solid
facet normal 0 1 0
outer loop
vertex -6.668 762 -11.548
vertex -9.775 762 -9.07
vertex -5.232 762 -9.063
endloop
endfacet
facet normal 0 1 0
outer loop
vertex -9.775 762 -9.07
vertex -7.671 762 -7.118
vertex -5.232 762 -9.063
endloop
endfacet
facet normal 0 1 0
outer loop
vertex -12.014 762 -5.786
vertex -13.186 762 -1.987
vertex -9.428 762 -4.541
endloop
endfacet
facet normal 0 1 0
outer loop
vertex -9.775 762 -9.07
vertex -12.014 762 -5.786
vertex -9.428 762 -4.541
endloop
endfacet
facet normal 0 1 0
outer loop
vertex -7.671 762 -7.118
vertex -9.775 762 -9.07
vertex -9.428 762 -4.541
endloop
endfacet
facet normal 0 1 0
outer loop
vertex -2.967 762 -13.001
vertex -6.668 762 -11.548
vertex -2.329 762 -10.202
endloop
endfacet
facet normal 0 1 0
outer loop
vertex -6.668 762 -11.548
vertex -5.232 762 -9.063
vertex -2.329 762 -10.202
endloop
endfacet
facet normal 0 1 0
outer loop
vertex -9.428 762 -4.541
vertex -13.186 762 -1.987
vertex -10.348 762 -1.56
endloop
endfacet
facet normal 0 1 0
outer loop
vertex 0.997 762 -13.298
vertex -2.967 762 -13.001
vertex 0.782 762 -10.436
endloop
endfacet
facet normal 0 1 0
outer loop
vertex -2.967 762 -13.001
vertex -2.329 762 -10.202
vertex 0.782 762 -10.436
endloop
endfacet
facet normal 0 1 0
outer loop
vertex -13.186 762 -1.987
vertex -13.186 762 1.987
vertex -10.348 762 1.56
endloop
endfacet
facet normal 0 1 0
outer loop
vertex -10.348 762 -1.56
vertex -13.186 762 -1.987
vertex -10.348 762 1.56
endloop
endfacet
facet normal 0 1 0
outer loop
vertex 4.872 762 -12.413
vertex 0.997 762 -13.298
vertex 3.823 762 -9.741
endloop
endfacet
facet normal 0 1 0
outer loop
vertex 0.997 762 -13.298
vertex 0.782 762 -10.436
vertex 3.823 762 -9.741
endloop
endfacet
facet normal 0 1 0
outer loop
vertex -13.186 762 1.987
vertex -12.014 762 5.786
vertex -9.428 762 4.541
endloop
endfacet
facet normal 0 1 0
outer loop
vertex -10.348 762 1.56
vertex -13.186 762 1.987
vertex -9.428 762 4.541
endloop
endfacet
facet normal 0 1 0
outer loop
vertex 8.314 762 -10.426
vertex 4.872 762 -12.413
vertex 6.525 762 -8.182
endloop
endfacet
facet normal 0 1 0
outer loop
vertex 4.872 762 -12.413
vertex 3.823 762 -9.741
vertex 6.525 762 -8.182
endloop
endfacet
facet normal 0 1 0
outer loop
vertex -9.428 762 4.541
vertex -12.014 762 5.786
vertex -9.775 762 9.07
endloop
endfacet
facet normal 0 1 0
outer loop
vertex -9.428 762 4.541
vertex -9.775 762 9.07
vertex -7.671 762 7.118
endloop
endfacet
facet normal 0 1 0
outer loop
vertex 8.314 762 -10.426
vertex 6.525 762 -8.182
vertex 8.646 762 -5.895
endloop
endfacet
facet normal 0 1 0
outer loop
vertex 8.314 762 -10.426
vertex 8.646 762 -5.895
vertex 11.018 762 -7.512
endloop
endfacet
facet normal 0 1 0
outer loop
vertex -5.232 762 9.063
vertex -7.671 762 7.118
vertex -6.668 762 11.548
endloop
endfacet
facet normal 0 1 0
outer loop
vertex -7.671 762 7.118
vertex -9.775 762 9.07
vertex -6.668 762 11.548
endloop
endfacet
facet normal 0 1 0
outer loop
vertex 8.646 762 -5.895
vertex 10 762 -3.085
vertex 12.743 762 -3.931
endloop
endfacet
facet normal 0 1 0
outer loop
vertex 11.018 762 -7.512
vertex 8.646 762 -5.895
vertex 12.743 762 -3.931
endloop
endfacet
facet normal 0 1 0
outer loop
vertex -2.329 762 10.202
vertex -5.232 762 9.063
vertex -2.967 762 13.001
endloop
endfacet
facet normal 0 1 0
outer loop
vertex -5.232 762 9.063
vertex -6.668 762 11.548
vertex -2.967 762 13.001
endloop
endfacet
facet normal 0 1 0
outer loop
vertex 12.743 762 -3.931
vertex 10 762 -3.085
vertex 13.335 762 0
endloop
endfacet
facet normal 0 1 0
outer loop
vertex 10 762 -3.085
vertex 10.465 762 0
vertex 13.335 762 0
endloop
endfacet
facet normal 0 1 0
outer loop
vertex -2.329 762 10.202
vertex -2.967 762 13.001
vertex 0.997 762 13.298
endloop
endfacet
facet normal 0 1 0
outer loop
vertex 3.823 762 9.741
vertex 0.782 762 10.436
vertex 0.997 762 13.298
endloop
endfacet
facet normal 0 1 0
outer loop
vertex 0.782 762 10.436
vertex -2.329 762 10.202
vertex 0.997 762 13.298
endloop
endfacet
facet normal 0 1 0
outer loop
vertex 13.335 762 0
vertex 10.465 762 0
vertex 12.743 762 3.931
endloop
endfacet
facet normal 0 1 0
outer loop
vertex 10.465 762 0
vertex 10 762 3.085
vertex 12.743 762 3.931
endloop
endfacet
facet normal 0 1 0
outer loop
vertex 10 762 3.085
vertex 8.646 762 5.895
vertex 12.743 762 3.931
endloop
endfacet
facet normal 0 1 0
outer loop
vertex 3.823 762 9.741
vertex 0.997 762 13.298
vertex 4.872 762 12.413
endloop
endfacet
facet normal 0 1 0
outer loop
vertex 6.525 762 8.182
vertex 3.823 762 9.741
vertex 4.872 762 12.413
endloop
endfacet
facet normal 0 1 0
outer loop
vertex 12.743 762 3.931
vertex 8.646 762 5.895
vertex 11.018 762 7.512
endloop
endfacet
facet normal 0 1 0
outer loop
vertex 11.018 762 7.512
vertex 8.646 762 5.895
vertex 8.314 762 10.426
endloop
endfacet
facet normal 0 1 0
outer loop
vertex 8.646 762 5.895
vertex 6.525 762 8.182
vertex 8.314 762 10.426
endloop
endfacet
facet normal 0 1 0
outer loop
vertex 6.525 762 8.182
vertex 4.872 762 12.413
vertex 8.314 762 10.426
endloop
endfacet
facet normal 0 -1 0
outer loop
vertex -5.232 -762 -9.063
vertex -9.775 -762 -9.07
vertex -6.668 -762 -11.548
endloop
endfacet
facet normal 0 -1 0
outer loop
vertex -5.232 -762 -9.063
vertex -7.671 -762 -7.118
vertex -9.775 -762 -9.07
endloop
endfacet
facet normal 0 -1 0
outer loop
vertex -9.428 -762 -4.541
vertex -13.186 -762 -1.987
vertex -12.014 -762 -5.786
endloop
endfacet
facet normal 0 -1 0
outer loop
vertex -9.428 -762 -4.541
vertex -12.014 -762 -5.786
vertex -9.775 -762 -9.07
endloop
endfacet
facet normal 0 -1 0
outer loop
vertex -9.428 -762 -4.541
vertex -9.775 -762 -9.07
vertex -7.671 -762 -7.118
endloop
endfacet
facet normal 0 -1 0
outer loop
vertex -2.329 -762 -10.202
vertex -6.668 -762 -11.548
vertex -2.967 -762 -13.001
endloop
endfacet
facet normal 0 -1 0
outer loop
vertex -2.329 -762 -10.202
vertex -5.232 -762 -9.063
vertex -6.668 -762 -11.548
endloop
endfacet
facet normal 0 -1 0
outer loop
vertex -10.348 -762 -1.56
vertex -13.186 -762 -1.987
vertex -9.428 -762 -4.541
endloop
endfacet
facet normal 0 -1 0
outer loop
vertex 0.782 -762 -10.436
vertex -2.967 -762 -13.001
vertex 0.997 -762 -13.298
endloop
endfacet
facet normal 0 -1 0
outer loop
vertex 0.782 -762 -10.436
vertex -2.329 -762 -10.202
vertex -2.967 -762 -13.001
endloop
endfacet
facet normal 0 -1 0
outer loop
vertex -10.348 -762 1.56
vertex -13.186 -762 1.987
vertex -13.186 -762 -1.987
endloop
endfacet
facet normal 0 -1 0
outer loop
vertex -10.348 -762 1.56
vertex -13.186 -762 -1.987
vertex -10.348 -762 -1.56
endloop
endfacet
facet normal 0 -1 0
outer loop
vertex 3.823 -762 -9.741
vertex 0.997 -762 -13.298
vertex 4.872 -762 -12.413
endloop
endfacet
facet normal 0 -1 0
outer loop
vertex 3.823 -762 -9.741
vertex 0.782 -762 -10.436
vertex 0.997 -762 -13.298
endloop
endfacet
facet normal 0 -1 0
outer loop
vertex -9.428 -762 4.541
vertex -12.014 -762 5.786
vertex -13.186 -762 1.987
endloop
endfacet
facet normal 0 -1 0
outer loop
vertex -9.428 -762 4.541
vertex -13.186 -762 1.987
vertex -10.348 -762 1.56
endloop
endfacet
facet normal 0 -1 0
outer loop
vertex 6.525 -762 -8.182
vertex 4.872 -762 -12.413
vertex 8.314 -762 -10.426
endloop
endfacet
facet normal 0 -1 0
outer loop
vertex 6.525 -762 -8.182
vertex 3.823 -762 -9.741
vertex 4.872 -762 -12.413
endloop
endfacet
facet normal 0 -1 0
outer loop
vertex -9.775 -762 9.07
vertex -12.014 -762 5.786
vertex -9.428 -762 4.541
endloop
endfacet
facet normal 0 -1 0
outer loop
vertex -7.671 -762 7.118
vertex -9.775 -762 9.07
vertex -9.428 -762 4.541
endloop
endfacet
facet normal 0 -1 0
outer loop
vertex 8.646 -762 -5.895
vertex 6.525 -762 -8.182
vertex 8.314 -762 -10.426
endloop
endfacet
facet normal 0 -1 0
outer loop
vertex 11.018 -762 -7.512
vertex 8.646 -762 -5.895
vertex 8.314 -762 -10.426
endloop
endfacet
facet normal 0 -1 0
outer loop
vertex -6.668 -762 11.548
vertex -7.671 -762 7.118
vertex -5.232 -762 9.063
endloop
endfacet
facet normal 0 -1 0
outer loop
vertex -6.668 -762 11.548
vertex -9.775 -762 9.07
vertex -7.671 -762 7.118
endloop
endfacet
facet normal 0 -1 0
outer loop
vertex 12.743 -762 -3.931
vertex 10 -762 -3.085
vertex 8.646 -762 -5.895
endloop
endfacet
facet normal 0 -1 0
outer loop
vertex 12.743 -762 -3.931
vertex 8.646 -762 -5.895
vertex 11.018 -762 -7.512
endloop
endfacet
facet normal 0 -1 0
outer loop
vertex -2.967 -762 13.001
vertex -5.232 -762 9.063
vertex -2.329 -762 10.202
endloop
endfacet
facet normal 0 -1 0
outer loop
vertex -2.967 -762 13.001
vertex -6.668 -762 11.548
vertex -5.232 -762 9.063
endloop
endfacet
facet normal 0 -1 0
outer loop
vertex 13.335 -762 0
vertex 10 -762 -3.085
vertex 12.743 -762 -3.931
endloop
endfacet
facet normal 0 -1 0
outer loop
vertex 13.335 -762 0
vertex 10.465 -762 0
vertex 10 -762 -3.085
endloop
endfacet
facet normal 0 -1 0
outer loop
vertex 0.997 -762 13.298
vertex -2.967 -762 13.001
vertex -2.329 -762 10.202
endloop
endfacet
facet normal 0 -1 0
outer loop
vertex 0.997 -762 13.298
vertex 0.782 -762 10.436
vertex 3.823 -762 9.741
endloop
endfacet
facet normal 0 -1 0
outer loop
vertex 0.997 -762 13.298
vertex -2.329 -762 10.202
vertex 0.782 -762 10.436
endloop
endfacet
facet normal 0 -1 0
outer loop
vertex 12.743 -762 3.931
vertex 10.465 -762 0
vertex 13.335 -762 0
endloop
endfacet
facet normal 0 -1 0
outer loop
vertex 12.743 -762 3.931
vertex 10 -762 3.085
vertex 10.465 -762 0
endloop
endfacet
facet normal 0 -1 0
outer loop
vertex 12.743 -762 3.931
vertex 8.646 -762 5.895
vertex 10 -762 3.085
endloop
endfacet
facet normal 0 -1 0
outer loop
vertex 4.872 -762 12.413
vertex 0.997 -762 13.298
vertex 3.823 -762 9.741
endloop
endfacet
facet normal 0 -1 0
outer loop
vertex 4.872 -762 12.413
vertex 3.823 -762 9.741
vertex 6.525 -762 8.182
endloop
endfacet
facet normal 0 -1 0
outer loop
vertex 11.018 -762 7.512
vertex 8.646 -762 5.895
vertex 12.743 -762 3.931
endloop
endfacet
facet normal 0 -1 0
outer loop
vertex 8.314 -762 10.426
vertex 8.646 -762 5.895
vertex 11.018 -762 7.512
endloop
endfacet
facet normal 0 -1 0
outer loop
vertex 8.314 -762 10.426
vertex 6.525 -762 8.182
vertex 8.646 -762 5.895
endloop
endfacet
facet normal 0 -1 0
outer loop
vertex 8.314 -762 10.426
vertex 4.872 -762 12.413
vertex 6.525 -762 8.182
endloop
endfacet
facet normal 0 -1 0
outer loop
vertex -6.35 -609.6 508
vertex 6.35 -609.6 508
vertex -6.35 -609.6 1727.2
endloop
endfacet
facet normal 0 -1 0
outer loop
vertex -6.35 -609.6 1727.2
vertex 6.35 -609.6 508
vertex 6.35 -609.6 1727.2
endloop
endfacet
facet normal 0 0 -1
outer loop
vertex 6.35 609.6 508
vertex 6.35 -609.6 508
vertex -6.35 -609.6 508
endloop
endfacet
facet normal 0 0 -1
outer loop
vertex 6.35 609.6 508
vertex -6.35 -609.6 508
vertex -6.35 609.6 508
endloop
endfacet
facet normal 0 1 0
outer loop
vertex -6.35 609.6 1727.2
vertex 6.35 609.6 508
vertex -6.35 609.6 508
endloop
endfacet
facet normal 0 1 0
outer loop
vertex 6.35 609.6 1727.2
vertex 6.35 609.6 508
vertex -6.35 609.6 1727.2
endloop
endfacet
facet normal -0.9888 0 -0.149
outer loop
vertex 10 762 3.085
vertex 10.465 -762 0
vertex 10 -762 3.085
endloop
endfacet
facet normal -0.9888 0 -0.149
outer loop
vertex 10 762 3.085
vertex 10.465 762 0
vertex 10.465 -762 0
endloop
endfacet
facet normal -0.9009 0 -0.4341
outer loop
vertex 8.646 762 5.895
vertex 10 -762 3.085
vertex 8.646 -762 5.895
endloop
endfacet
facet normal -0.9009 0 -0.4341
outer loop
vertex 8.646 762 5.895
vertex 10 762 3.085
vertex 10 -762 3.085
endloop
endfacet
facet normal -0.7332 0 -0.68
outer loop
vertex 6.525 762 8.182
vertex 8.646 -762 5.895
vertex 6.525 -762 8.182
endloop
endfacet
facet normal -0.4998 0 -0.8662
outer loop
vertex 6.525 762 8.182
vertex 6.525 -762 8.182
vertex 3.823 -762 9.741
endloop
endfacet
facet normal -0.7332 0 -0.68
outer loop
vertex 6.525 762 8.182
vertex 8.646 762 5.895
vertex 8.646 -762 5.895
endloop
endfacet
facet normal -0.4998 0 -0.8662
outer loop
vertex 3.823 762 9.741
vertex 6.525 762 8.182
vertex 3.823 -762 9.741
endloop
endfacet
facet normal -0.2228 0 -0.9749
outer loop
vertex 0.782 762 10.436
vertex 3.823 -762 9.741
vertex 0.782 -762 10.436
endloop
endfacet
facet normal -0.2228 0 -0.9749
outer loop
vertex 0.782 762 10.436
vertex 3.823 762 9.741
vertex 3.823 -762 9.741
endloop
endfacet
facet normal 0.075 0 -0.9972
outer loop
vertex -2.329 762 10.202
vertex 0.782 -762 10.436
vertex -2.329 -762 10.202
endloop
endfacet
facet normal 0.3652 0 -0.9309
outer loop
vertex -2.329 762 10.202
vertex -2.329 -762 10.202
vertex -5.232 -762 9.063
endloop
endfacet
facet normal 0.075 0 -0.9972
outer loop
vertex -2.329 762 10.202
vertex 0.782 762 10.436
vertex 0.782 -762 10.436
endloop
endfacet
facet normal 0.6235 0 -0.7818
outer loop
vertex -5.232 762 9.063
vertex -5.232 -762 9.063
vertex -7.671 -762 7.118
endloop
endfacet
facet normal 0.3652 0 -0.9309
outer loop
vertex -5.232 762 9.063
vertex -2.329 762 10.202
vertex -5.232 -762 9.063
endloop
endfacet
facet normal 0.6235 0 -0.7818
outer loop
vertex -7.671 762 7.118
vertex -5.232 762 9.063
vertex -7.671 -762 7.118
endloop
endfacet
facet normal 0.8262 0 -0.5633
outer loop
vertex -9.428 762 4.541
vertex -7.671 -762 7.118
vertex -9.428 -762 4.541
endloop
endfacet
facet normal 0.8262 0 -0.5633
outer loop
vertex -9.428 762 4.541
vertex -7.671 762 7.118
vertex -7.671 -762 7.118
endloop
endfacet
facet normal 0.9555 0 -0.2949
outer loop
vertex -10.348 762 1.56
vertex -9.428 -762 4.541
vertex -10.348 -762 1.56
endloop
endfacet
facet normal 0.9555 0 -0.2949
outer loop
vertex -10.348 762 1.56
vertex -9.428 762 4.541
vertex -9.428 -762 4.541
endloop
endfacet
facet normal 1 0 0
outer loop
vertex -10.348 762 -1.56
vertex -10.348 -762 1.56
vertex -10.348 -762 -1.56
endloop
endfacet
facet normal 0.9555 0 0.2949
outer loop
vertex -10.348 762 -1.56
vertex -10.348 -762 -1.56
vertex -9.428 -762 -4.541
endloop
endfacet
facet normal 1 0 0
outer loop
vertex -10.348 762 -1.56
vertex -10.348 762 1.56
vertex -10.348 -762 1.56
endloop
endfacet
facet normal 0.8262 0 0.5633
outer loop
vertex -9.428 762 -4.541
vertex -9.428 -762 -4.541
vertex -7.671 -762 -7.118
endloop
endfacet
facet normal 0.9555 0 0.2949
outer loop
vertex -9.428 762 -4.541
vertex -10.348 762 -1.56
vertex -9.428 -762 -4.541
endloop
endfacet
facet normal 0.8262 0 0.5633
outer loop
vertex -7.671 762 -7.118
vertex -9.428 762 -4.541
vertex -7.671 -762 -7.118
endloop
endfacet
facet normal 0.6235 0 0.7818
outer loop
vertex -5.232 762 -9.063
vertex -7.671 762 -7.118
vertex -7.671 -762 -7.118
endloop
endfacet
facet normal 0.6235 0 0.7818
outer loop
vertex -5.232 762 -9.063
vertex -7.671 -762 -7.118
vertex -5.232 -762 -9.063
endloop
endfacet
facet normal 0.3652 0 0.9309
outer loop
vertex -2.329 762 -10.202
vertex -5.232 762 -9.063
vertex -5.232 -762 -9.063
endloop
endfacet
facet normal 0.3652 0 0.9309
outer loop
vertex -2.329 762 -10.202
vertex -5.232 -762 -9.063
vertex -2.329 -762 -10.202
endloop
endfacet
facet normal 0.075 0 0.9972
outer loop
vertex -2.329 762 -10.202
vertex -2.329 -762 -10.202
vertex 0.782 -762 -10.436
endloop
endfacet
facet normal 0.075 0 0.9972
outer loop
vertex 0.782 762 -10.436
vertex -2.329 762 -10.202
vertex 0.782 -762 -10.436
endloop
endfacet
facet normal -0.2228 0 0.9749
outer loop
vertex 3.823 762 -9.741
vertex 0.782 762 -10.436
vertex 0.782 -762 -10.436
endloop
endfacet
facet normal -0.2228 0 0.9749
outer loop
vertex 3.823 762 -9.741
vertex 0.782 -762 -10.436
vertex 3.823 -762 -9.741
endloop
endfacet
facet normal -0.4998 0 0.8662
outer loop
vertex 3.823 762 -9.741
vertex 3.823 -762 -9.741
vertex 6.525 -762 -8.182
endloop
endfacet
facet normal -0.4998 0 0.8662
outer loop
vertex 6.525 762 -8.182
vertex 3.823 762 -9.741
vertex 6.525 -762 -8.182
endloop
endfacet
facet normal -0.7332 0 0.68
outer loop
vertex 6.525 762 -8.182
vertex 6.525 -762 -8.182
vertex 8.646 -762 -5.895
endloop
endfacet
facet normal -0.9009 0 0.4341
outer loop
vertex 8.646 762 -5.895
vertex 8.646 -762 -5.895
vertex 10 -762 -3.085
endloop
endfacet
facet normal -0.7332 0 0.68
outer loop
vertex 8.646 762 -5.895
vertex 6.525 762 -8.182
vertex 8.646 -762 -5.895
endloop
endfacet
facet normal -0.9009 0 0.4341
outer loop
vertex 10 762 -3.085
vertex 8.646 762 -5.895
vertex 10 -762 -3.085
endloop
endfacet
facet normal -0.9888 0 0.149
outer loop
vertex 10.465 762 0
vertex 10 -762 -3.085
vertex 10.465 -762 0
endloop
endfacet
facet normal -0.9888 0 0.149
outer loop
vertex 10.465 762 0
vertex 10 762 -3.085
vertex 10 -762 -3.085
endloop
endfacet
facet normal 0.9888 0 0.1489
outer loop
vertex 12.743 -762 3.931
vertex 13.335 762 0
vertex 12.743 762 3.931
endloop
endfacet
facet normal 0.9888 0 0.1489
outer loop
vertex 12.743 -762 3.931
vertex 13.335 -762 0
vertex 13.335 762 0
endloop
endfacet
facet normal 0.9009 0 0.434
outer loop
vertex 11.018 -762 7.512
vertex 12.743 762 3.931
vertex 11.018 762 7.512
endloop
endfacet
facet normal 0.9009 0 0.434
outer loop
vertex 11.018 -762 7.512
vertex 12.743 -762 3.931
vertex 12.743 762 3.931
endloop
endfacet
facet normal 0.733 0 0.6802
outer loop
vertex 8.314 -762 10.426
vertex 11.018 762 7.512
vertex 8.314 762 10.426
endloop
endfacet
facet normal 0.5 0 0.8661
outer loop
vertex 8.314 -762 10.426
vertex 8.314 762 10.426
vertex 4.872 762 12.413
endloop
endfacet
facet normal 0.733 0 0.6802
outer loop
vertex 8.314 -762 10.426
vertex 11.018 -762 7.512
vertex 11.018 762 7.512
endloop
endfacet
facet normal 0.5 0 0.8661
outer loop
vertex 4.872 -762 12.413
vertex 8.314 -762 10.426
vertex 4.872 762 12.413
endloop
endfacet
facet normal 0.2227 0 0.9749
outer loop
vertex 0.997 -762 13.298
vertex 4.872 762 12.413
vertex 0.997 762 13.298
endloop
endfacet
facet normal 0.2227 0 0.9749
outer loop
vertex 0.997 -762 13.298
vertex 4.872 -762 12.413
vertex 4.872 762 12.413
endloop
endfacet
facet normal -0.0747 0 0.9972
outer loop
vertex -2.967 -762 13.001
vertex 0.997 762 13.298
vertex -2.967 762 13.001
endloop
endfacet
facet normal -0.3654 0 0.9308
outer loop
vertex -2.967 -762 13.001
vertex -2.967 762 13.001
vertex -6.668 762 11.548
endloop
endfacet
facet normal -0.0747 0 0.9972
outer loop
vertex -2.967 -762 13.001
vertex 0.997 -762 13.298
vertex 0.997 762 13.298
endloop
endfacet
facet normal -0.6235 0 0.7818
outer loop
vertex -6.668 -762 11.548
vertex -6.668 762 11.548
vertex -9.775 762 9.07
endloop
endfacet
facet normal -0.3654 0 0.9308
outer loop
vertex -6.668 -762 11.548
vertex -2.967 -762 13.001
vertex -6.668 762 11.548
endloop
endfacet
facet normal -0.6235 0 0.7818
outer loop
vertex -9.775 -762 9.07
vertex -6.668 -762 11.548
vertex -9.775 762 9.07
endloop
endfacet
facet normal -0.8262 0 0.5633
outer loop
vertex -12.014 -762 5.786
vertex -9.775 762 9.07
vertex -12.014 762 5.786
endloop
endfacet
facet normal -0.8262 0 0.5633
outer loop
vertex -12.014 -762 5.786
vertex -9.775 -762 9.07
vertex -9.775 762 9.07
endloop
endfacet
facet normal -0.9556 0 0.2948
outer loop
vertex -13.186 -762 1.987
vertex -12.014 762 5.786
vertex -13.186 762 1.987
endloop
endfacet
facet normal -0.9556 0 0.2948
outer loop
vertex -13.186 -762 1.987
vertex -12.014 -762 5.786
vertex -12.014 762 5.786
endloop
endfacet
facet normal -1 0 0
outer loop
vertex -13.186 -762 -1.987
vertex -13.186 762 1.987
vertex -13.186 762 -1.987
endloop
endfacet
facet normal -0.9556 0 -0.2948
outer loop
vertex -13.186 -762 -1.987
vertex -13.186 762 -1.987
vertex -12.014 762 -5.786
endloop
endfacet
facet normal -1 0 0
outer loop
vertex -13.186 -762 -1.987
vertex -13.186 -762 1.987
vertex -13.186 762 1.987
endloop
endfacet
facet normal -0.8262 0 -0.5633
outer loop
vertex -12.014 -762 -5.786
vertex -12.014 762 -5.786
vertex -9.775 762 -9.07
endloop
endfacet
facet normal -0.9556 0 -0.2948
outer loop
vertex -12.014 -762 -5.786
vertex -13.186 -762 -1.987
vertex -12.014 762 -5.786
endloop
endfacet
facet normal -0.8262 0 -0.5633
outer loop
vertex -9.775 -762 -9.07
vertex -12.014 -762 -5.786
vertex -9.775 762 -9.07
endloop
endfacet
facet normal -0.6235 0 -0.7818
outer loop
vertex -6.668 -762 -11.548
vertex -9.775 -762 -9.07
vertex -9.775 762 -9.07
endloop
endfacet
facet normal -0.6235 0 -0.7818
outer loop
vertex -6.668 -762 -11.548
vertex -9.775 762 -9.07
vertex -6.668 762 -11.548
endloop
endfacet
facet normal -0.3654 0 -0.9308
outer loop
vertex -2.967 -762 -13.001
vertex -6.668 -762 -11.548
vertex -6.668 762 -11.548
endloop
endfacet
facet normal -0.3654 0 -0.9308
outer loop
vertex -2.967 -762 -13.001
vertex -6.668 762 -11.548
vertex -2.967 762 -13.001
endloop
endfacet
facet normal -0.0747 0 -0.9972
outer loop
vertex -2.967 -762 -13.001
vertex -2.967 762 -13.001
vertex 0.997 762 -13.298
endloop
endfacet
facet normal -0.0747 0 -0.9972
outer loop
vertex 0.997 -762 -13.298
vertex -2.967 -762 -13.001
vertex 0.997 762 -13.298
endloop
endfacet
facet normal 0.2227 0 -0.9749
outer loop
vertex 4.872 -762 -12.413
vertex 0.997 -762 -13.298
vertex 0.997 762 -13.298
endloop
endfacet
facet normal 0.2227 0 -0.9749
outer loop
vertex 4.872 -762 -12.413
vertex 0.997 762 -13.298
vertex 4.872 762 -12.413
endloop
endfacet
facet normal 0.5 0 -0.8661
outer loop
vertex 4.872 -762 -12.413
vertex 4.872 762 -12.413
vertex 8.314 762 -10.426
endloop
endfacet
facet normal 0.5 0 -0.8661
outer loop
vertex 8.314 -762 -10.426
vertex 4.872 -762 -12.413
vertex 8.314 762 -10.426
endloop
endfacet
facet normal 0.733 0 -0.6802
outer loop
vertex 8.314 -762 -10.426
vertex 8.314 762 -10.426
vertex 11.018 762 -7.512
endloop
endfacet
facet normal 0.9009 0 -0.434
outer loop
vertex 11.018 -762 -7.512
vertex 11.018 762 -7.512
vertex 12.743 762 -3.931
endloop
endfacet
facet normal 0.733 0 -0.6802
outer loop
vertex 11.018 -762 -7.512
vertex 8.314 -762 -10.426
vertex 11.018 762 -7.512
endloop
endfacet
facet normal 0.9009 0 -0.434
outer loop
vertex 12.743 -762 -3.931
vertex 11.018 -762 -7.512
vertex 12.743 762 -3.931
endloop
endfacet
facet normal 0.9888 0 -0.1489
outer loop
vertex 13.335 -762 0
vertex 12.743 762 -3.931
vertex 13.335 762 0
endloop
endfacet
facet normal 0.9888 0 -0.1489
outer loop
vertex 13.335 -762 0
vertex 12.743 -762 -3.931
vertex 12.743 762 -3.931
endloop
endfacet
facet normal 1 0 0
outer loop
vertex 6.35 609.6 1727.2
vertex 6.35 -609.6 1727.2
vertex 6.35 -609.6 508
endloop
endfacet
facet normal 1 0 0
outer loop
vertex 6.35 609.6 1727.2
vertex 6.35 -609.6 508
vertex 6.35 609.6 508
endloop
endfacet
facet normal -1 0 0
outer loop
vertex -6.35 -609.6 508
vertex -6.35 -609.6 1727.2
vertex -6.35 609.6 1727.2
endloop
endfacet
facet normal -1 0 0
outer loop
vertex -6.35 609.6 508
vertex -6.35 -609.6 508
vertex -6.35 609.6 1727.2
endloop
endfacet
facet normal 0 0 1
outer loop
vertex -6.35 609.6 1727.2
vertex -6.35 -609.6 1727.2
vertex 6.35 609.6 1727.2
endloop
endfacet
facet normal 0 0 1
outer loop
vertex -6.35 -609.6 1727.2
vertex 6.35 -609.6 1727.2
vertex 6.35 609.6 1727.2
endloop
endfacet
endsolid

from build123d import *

# Parameters (mm, degrees)
F0_R     = 13.335
F0_R_2   = 10.4648
F1_DEPTH = 762
F2_W     = 1219.2
F2_H     = 1219.2
F3_DEPTH = 6.35


with BuildPart() as f1:
    # F0 (on Front) → F1 (new body, symmetric)
    with BuildSketch(Plane.XZ):
        Circle(F0_R)
        Circle(F0_R_2, mode=Mode.SUBTRACT)
    extrude(amount=F1_DEPTH, both=True)


with BuildPart() as f3:
    # F2 (on Right) → F3 (new body, symmetric)
    with BuildSketch(Plane.YZ):
        with Locations((0, 1117.6)):
            Rectangle(F2_W, F2_H)
    extrude(amount=F3_DEPTH, both=True)


solid = Compound([f1.part, f3.part])
